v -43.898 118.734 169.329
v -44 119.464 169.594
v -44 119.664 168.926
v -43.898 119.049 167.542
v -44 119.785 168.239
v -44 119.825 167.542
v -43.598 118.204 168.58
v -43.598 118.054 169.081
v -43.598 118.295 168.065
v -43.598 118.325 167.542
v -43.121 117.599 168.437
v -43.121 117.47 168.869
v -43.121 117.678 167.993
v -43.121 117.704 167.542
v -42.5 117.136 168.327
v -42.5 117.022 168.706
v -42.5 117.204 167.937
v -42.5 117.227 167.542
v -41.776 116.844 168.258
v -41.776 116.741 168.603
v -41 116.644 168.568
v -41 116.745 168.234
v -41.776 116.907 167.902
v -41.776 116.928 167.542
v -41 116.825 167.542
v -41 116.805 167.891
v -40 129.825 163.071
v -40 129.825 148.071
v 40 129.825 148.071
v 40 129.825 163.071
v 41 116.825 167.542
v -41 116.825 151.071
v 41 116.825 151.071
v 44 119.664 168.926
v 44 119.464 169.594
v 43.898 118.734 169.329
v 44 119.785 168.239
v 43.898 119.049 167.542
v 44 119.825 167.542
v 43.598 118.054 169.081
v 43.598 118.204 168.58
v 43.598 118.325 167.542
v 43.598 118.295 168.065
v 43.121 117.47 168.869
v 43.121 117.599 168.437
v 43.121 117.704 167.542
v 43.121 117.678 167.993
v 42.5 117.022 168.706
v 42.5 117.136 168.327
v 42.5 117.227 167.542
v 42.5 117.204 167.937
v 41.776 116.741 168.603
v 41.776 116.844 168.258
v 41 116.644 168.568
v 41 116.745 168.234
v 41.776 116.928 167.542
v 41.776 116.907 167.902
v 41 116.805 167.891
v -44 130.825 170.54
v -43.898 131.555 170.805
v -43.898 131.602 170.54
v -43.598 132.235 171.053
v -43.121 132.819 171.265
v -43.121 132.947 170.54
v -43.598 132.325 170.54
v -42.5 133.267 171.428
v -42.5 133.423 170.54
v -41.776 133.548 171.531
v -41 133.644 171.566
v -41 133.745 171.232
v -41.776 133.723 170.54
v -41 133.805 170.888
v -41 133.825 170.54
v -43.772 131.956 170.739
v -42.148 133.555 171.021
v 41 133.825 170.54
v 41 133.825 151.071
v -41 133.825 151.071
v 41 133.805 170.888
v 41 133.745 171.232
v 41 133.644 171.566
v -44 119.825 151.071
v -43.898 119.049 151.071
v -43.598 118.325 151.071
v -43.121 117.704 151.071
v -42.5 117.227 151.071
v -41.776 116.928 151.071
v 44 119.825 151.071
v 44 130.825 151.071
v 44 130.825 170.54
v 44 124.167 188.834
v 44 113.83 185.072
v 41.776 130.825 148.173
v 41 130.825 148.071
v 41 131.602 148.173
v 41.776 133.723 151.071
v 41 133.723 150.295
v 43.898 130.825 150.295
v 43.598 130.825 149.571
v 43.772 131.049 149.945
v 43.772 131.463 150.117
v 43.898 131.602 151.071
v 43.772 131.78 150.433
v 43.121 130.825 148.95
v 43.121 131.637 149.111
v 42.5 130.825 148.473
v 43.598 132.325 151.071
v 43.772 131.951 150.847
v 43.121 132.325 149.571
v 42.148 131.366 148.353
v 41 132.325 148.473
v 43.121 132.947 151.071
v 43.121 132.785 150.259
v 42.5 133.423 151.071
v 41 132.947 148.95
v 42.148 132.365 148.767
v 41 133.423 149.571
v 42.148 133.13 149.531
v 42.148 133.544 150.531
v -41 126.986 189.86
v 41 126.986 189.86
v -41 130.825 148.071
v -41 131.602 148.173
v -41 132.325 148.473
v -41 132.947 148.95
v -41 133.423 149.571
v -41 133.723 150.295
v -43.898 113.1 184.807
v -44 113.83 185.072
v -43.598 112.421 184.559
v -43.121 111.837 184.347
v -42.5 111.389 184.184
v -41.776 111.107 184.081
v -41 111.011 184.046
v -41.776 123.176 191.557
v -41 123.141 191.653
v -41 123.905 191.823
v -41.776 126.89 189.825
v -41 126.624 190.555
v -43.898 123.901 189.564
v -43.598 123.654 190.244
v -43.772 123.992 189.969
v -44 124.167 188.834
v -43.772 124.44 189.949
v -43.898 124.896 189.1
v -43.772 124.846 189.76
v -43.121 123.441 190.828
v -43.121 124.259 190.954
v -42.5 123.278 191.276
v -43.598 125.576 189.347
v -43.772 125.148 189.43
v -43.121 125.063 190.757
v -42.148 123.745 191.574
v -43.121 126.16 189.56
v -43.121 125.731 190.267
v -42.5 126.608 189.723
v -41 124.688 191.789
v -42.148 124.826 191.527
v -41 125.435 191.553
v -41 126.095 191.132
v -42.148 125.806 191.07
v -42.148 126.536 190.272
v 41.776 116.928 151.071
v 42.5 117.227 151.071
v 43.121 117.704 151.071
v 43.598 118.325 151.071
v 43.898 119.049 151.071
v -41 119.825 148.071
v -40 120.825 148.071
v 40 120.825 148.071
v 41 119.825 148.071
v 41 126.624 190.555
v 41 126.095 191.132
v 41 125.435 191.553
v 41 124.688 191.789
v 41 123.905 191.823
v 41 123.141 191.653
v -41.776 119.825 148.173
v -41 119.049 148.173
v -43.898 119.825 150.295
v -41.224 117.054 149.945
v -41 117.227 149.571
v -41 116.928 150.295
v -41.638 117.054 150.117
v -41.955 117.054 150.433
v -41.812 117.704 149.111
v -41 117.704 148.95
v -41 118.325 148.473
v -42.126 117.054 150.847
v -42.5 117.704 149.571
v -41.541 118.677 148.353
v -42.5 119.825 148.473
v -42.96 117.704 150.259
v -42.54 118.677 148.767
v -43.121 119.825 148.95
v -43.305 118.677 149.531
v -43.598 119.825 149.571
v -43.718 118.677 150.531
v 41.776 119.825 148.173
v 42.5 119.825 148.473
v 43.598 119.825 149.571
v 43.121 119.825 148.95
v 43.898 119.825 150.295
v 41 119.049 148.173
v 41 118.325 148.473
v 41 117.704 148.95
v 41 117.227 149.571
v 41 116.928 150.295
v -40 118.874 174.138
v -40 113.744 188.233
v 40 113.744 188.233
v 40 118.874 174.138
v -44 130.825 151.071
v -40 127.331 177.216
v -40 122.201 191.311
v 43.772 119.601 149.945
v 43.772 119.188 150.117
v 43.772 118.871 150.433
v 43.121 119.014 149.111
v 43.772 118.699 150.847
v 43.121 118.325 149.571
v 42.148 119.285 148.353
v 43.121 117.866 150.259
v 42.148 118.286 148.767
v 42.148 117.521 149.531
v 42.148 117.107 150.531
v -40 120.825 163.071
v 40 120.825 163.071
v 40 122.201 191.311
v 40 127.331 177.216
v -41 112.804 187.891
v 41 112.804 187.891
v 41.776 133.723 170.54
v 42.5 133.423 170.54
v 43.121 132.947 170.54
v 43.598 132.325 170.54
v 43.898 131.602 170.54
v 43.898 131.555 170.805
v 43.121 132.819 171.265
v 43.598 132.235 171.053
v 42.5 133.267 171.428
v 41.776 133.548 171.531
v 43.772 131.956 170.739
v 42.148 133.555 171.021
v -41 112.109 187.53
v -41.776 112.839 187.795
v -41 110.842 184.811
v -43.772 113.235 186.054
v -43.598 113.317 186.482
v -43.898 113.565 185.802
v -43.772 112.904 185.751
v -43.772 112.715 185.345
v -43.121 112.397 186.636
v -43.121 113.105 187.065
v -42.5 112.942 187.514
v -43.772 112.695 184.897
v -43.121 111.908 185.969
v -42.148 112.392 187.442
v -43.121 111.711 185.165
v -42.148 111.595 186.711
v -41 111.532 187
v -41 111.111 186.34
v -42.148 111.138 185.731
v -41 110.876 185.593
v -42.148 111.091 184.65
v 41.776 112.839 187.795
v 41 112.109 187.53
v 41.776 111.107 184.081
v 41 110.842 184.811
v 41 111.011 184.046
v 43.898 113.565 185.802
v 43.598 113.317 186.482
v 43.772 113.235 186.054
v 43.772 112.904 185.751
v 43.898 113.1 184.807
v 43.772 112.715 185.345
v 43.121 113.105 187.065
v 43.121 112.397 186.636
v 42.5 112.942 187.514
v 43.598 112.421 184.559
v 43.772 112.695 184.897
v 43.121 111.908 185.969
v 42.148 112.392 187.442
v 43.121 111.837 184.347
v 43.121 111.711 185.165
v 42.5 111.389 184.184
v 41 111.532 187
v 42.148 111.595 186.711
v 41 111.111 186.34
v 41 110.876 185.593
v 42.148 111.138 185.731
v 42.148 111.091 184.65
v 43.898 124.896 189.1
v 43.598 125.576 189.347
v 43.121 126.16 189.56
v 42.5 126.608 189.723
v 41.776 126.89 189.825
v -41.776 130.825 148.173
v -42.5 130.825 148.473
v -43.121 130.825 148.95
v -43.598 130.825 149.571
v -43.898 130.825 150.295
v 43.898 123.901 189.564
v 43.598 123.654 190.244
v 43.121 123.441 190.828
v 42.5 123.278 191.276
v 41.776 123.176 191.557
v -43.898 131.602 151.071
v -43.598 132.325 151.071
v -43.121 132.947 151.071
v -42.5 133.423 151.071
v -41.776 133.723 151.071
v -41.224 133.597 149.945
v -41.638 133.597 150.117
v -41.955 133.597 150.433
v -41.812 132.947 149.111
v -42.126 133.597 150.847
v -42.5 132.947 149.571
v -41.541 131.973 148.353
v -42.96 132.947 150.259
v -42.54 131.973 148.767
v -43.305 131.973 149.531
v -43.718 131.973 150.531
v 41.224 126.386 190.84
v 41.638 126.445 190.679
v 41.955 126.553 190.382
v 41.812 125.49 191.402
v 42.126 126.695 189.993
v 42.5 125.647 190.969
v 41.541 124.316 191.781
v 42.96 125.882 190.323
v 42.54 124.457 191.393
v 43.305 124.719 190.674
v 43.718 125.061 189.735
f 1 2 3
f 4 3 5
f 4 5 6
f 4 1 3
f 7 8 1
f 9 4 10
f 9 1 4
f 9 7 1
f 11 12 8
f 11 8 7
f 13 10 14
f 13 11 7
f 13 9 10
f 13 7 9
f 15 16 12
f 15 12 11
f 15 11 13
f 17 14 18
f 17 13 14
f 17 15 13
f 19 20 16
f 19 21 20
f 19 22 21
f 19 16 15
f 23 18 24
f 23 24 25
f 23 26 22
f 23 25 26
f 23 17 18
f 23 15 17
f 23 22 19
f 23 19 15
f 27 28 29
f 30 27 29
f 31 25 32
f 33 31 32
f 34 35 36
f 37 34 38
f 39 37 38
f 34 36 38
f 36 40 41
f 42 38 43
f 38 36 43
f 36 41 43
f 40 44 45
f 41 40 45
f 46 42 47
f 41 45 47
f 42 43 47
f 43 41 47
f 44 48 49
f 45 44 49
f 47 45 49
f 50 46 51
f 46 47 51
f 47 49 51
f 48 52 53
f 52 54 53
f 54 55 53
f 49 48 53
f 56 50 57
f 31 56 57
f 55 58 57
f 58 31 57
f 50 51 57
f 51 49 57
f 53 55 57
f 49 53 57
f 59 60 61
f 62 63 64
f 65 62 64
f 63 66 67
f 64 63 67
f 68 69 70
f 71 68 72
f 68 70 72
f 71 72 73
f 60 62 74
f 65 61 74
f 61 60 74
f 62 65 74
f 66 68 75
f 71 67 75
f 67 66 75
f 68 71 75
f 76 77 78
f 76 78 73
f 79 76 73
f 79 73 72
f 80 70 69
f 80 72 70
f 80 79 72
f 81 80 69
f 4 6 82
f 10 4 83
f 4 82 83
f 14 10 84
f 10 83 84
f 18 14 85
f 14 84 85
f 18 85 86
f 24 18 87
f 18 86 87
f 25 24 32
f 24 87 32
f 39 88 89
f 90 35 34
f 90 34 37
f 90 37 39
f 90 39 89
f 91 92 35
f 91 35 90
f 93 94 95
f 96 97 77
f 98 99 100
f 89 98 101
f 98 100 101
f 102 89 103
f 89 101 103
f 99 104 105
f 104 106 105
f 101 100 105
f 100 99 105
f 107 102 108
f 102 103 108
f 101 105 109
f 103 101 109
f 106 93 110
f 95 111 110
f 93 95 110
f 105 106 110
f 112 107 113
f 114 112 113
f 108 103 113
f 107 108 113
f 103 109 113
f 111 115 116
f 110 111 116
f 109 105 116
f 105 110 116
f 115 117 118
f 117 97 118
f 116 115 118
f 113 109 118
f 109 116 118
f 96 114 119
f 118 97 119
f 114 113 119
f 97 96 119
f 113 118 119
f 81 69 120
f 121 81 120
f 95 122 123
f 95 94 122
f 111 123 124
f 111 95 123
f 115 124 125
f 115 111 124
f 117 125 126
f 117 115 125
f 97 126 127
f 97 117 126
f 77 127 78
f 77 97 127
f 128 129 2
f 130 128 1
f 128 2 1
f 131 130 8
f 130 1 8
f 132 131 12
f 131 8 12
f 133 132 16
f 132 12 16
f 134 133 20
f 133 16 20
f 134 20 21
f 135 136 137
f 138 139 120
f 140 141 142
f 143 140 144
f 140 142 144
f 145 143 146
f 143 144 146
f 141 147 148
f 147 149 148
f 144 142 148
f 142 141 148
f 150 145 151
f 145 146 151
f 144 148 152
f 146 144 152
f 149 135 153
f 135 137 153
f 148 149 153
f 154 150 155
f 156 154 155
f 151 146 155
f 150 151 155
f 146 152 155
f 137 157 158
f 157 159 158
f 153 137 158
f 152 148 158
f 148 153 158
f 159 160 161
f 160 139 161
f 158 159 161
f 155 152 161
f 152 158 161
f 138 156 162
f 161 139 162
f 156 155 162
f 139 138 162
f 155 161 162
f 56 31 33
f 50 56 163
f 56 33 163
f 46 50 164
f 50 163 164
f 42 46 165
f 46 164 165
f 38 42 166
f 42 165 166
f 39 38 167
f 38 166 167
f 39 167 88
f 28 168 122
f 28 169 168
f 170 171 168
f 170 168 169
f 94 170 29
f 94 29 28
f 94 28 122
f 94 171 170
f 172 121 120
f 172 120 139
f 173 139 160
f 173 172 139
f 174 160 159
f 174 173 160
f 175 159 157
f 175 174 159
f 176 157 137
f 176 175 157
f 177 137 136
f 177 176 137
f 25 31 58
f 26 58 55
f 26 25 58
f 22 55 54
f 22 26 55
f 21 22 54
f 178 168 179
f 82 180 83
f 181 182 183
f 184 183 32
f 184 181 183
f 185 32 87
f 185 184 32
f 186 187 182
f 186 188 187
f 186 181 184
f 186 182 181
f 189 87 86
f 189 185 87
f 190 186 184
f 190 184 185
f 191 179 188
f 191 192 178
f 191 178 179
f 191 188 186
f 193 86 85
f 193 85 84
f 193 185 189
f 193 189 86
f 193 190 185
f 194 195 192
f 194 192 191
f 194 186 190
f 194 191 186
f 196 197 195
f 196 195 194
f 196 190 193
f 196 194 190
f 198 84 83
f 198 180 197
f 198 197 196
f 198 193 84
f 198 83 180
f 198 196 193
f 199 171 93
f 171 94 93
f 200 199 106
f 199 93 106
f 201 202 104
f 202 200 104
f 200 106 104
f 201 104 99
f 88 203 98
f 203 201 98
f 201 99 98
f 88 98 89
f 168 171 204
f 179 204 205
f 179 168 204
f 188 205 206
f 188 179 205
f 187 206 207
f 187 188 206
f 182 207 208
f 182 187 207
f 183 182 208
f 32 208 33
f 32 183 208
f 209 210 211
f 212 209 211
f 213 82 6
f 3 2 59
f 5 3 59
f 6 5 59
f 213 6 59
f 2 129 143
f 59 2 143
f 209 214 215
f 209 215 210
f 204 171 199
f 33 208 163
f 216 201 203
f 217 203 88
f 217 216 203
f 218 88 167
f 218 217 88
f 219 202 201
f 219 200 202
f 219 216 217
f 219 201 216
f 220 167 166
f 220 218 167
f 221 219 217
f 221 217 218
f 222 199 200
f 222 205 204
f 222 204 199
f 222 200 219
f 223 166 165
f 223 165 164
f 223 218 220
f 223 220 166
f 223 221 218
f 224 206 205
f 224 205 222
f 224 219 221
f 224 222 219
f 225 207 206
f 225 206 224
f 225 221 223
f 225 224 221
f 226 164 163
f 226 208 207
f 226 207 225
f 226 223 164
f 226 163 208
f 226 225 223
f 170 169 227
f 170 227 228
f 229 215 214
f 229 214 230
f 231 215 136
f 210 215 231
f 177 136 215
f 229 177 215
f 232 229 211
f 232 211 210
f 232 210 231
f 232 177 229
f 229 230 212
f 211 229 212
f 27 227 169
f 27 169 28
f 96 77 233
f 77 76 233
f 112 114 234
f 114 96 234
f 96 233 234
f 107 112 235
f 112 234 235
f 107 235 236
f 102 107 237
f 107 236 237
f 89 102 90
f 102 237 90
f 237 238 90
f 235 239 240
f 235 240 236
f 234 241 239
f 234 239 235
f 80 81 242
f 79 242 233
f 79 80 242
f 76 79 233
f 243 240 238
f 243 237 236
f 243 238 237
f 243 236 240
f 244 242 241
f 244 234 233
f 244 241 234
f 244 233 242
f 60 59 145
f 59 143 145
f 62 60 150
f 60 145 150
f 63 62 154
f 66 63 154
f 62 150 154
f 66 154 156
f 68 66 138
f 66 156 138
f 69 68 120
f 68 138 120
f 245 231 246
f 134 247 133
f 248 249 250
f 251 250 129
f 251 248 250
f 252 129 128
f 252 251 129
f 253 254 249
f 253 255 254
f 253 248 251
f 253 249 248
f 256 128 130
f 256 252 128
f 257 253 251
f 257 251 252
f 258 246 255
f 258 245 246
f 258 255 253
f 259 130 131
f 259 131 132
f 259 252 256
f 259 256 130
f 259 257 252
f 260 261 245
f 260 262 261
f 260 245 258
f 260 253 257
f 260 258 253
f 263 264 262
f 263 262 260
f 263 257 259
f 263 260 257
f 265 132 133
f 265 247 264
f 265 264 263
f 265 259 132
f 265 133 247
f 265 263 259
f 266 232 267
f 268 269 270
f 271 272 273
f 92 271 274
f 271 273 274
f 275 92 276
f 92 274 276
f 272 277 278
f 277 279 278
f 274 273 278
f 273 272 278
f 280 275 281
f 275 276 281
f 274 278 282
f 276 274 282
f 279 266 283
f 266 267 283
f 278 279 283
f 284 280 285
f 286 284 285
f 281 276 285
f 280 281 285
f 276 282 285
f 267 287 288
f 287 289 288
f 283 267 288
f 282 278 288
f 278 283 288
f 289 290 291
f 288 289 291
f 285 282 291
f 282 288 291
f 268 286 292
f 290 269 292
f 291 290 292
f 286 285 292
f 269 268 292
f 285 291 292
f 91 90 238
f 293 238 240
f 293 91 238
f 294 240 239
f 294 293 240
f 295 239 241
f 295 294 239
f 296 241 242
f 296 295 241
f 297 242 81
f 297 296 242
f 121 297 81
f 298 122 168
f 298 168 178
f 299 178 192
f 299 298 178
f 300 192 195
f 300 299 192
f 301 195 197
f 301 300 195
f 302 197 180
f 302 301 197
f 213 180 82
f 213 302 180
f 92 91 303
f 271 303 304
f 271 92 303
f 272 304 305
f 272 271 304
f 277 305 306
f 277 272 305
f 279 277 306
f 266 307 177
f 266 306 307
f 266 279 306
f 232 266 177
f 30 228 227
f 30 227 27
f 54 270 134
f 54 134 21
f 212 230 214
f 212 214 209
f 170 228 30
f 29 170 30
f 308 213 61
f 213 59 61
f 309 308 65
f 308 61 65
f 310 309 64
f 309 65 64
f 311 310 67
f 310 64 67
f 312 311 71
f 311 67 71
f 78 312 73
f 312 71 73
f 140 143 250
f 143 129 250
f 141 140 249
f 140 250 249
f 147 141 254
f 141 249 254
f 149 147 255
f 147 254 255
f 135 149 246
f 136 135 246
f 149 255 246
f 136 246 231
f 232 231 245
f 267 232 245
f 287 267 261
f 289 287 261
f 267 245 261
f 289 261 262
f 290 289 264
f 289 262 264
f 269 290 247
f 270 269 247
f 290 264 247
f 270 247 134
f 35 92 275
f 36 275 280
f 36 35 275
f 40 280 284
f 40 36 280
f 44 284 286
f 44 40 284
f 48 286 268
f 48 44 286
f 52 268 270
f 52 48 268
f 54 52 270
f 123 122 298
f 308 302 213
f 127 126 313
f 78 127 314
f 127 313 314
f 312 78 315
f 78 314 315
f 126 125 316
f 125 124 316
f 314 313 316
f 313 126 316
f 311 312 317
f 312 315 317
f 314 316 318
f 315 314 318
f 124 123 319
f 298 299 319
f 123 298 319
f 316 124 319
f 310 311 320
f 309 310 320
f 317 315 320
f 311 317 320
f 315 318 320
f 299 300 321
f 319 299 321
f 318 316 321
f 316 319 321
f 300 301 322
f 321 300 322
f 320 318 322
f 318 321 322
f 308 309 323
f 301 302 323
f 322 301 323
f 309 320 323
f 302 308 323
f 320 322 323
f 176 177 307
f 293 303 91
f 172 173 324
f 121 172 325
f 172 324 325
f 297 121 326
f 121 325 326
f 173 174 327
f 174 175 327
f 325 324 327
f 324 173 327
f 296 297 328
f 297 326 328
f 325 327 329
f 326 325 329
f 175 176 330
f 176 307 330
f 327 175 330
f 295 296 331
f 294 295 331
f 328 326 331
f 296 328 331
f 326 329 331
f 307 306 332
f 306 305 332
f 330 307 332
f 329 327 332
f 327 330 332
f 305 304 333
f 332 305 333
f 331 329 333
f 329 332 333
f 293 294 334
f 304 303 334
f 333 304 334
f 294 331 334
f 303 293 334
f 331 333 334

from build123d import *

# Parameters (mm, degrees)
PAD008_DEPTH    = 44
SKETCH009_W     = 9
SKETCH009_H     = 80
POCKET_DEPTH    = 15
SKETCH011_W     = 9
SKETCH011_H     = 80
POCKET001_DEPTH = 15
FILLET006_R     = 3


with BuildPart() as part:
    # Sketch007 → Pad008 (new body, symmetric)
    with BuildSketch(Plane.YZ):
        Polygon((122.8253676514, 151.0712742396), (139.8253676514, 151.0712742396), (139.8253676514, 174.0688329116), (131.9597393383, 195.6794690919), (115.9849647849, 189.8651266553), (122.8253676514, 171.0712742396), align=None)
    extrude(amount=PAD008_DEPTH, both=True)

    # Sketch009 (on Face4 of Pad008) → Pocket (cut)
    with BuildSketch(Plane(origin=(0, -47.4538119498, 130.378276799), x_dir=(0, -0.9396926208, -0.3420201433), z_dir=(0, -0.3420201433, 0.9396926208))):
        with Locations((-182.4279133617, 0)):
            Rectangle(SKETCH009_W, SKETCH009_H)
    extrude(amount=-POCKET_DEPTH, mode=Mode.SUBTRACT)

    # Sketch011 (on Face1 of Pocket) → Pocket001 (cut)
    with BuildSketch(Plane.YX.offset(-151.0712742396)):
        with Locations((131.3253676514, 0)):
            Rectangle(SKETCH011_W, SKETCH011_H)
    extrude(amount=-POCKET001_DEPTH, mode=Mode.SUBTRACT)

    # Fillet006
    fillet006_edges = [part.edges().sort_by_distance(p)[0] for p in [
        (0, 139.825368, 174.068833),
        (0, 122.825368, 171.071274),
        (0, 115.984965, 189.865127),
        (44, 123.972352, 192.772298),
        (0, 131.959739, 195.679469),
        (-44, 123.972352, 192.772298),
        (-44, 131.325368, 151.071274),
        (0, 122.825368, 151.071274),
        (0, 139.825368, 151.071274),
        (44, 131.325368, 151.071274),
        (-44, 135.892553, 184.874151),
        (-44, 139.825368, 162.570054),
        (-44, 119.405166, 180.4682),
        (-44, 122.825368, 161.071274),
        (44, 119.405166, 180.4682),
        (44, 122.825368, 161.071274),
        (44, 135.892553, 184.874151),
        (44, 139.825368, 162.570054),
    ]]
    fillet(fillet006_edges, radius=FILLET006_R)


with BuildPart() as part_1:
    # Body011 placement: moved
    add(part.part.moved(Location((0, -6, -3))))


solid = part_1.part
